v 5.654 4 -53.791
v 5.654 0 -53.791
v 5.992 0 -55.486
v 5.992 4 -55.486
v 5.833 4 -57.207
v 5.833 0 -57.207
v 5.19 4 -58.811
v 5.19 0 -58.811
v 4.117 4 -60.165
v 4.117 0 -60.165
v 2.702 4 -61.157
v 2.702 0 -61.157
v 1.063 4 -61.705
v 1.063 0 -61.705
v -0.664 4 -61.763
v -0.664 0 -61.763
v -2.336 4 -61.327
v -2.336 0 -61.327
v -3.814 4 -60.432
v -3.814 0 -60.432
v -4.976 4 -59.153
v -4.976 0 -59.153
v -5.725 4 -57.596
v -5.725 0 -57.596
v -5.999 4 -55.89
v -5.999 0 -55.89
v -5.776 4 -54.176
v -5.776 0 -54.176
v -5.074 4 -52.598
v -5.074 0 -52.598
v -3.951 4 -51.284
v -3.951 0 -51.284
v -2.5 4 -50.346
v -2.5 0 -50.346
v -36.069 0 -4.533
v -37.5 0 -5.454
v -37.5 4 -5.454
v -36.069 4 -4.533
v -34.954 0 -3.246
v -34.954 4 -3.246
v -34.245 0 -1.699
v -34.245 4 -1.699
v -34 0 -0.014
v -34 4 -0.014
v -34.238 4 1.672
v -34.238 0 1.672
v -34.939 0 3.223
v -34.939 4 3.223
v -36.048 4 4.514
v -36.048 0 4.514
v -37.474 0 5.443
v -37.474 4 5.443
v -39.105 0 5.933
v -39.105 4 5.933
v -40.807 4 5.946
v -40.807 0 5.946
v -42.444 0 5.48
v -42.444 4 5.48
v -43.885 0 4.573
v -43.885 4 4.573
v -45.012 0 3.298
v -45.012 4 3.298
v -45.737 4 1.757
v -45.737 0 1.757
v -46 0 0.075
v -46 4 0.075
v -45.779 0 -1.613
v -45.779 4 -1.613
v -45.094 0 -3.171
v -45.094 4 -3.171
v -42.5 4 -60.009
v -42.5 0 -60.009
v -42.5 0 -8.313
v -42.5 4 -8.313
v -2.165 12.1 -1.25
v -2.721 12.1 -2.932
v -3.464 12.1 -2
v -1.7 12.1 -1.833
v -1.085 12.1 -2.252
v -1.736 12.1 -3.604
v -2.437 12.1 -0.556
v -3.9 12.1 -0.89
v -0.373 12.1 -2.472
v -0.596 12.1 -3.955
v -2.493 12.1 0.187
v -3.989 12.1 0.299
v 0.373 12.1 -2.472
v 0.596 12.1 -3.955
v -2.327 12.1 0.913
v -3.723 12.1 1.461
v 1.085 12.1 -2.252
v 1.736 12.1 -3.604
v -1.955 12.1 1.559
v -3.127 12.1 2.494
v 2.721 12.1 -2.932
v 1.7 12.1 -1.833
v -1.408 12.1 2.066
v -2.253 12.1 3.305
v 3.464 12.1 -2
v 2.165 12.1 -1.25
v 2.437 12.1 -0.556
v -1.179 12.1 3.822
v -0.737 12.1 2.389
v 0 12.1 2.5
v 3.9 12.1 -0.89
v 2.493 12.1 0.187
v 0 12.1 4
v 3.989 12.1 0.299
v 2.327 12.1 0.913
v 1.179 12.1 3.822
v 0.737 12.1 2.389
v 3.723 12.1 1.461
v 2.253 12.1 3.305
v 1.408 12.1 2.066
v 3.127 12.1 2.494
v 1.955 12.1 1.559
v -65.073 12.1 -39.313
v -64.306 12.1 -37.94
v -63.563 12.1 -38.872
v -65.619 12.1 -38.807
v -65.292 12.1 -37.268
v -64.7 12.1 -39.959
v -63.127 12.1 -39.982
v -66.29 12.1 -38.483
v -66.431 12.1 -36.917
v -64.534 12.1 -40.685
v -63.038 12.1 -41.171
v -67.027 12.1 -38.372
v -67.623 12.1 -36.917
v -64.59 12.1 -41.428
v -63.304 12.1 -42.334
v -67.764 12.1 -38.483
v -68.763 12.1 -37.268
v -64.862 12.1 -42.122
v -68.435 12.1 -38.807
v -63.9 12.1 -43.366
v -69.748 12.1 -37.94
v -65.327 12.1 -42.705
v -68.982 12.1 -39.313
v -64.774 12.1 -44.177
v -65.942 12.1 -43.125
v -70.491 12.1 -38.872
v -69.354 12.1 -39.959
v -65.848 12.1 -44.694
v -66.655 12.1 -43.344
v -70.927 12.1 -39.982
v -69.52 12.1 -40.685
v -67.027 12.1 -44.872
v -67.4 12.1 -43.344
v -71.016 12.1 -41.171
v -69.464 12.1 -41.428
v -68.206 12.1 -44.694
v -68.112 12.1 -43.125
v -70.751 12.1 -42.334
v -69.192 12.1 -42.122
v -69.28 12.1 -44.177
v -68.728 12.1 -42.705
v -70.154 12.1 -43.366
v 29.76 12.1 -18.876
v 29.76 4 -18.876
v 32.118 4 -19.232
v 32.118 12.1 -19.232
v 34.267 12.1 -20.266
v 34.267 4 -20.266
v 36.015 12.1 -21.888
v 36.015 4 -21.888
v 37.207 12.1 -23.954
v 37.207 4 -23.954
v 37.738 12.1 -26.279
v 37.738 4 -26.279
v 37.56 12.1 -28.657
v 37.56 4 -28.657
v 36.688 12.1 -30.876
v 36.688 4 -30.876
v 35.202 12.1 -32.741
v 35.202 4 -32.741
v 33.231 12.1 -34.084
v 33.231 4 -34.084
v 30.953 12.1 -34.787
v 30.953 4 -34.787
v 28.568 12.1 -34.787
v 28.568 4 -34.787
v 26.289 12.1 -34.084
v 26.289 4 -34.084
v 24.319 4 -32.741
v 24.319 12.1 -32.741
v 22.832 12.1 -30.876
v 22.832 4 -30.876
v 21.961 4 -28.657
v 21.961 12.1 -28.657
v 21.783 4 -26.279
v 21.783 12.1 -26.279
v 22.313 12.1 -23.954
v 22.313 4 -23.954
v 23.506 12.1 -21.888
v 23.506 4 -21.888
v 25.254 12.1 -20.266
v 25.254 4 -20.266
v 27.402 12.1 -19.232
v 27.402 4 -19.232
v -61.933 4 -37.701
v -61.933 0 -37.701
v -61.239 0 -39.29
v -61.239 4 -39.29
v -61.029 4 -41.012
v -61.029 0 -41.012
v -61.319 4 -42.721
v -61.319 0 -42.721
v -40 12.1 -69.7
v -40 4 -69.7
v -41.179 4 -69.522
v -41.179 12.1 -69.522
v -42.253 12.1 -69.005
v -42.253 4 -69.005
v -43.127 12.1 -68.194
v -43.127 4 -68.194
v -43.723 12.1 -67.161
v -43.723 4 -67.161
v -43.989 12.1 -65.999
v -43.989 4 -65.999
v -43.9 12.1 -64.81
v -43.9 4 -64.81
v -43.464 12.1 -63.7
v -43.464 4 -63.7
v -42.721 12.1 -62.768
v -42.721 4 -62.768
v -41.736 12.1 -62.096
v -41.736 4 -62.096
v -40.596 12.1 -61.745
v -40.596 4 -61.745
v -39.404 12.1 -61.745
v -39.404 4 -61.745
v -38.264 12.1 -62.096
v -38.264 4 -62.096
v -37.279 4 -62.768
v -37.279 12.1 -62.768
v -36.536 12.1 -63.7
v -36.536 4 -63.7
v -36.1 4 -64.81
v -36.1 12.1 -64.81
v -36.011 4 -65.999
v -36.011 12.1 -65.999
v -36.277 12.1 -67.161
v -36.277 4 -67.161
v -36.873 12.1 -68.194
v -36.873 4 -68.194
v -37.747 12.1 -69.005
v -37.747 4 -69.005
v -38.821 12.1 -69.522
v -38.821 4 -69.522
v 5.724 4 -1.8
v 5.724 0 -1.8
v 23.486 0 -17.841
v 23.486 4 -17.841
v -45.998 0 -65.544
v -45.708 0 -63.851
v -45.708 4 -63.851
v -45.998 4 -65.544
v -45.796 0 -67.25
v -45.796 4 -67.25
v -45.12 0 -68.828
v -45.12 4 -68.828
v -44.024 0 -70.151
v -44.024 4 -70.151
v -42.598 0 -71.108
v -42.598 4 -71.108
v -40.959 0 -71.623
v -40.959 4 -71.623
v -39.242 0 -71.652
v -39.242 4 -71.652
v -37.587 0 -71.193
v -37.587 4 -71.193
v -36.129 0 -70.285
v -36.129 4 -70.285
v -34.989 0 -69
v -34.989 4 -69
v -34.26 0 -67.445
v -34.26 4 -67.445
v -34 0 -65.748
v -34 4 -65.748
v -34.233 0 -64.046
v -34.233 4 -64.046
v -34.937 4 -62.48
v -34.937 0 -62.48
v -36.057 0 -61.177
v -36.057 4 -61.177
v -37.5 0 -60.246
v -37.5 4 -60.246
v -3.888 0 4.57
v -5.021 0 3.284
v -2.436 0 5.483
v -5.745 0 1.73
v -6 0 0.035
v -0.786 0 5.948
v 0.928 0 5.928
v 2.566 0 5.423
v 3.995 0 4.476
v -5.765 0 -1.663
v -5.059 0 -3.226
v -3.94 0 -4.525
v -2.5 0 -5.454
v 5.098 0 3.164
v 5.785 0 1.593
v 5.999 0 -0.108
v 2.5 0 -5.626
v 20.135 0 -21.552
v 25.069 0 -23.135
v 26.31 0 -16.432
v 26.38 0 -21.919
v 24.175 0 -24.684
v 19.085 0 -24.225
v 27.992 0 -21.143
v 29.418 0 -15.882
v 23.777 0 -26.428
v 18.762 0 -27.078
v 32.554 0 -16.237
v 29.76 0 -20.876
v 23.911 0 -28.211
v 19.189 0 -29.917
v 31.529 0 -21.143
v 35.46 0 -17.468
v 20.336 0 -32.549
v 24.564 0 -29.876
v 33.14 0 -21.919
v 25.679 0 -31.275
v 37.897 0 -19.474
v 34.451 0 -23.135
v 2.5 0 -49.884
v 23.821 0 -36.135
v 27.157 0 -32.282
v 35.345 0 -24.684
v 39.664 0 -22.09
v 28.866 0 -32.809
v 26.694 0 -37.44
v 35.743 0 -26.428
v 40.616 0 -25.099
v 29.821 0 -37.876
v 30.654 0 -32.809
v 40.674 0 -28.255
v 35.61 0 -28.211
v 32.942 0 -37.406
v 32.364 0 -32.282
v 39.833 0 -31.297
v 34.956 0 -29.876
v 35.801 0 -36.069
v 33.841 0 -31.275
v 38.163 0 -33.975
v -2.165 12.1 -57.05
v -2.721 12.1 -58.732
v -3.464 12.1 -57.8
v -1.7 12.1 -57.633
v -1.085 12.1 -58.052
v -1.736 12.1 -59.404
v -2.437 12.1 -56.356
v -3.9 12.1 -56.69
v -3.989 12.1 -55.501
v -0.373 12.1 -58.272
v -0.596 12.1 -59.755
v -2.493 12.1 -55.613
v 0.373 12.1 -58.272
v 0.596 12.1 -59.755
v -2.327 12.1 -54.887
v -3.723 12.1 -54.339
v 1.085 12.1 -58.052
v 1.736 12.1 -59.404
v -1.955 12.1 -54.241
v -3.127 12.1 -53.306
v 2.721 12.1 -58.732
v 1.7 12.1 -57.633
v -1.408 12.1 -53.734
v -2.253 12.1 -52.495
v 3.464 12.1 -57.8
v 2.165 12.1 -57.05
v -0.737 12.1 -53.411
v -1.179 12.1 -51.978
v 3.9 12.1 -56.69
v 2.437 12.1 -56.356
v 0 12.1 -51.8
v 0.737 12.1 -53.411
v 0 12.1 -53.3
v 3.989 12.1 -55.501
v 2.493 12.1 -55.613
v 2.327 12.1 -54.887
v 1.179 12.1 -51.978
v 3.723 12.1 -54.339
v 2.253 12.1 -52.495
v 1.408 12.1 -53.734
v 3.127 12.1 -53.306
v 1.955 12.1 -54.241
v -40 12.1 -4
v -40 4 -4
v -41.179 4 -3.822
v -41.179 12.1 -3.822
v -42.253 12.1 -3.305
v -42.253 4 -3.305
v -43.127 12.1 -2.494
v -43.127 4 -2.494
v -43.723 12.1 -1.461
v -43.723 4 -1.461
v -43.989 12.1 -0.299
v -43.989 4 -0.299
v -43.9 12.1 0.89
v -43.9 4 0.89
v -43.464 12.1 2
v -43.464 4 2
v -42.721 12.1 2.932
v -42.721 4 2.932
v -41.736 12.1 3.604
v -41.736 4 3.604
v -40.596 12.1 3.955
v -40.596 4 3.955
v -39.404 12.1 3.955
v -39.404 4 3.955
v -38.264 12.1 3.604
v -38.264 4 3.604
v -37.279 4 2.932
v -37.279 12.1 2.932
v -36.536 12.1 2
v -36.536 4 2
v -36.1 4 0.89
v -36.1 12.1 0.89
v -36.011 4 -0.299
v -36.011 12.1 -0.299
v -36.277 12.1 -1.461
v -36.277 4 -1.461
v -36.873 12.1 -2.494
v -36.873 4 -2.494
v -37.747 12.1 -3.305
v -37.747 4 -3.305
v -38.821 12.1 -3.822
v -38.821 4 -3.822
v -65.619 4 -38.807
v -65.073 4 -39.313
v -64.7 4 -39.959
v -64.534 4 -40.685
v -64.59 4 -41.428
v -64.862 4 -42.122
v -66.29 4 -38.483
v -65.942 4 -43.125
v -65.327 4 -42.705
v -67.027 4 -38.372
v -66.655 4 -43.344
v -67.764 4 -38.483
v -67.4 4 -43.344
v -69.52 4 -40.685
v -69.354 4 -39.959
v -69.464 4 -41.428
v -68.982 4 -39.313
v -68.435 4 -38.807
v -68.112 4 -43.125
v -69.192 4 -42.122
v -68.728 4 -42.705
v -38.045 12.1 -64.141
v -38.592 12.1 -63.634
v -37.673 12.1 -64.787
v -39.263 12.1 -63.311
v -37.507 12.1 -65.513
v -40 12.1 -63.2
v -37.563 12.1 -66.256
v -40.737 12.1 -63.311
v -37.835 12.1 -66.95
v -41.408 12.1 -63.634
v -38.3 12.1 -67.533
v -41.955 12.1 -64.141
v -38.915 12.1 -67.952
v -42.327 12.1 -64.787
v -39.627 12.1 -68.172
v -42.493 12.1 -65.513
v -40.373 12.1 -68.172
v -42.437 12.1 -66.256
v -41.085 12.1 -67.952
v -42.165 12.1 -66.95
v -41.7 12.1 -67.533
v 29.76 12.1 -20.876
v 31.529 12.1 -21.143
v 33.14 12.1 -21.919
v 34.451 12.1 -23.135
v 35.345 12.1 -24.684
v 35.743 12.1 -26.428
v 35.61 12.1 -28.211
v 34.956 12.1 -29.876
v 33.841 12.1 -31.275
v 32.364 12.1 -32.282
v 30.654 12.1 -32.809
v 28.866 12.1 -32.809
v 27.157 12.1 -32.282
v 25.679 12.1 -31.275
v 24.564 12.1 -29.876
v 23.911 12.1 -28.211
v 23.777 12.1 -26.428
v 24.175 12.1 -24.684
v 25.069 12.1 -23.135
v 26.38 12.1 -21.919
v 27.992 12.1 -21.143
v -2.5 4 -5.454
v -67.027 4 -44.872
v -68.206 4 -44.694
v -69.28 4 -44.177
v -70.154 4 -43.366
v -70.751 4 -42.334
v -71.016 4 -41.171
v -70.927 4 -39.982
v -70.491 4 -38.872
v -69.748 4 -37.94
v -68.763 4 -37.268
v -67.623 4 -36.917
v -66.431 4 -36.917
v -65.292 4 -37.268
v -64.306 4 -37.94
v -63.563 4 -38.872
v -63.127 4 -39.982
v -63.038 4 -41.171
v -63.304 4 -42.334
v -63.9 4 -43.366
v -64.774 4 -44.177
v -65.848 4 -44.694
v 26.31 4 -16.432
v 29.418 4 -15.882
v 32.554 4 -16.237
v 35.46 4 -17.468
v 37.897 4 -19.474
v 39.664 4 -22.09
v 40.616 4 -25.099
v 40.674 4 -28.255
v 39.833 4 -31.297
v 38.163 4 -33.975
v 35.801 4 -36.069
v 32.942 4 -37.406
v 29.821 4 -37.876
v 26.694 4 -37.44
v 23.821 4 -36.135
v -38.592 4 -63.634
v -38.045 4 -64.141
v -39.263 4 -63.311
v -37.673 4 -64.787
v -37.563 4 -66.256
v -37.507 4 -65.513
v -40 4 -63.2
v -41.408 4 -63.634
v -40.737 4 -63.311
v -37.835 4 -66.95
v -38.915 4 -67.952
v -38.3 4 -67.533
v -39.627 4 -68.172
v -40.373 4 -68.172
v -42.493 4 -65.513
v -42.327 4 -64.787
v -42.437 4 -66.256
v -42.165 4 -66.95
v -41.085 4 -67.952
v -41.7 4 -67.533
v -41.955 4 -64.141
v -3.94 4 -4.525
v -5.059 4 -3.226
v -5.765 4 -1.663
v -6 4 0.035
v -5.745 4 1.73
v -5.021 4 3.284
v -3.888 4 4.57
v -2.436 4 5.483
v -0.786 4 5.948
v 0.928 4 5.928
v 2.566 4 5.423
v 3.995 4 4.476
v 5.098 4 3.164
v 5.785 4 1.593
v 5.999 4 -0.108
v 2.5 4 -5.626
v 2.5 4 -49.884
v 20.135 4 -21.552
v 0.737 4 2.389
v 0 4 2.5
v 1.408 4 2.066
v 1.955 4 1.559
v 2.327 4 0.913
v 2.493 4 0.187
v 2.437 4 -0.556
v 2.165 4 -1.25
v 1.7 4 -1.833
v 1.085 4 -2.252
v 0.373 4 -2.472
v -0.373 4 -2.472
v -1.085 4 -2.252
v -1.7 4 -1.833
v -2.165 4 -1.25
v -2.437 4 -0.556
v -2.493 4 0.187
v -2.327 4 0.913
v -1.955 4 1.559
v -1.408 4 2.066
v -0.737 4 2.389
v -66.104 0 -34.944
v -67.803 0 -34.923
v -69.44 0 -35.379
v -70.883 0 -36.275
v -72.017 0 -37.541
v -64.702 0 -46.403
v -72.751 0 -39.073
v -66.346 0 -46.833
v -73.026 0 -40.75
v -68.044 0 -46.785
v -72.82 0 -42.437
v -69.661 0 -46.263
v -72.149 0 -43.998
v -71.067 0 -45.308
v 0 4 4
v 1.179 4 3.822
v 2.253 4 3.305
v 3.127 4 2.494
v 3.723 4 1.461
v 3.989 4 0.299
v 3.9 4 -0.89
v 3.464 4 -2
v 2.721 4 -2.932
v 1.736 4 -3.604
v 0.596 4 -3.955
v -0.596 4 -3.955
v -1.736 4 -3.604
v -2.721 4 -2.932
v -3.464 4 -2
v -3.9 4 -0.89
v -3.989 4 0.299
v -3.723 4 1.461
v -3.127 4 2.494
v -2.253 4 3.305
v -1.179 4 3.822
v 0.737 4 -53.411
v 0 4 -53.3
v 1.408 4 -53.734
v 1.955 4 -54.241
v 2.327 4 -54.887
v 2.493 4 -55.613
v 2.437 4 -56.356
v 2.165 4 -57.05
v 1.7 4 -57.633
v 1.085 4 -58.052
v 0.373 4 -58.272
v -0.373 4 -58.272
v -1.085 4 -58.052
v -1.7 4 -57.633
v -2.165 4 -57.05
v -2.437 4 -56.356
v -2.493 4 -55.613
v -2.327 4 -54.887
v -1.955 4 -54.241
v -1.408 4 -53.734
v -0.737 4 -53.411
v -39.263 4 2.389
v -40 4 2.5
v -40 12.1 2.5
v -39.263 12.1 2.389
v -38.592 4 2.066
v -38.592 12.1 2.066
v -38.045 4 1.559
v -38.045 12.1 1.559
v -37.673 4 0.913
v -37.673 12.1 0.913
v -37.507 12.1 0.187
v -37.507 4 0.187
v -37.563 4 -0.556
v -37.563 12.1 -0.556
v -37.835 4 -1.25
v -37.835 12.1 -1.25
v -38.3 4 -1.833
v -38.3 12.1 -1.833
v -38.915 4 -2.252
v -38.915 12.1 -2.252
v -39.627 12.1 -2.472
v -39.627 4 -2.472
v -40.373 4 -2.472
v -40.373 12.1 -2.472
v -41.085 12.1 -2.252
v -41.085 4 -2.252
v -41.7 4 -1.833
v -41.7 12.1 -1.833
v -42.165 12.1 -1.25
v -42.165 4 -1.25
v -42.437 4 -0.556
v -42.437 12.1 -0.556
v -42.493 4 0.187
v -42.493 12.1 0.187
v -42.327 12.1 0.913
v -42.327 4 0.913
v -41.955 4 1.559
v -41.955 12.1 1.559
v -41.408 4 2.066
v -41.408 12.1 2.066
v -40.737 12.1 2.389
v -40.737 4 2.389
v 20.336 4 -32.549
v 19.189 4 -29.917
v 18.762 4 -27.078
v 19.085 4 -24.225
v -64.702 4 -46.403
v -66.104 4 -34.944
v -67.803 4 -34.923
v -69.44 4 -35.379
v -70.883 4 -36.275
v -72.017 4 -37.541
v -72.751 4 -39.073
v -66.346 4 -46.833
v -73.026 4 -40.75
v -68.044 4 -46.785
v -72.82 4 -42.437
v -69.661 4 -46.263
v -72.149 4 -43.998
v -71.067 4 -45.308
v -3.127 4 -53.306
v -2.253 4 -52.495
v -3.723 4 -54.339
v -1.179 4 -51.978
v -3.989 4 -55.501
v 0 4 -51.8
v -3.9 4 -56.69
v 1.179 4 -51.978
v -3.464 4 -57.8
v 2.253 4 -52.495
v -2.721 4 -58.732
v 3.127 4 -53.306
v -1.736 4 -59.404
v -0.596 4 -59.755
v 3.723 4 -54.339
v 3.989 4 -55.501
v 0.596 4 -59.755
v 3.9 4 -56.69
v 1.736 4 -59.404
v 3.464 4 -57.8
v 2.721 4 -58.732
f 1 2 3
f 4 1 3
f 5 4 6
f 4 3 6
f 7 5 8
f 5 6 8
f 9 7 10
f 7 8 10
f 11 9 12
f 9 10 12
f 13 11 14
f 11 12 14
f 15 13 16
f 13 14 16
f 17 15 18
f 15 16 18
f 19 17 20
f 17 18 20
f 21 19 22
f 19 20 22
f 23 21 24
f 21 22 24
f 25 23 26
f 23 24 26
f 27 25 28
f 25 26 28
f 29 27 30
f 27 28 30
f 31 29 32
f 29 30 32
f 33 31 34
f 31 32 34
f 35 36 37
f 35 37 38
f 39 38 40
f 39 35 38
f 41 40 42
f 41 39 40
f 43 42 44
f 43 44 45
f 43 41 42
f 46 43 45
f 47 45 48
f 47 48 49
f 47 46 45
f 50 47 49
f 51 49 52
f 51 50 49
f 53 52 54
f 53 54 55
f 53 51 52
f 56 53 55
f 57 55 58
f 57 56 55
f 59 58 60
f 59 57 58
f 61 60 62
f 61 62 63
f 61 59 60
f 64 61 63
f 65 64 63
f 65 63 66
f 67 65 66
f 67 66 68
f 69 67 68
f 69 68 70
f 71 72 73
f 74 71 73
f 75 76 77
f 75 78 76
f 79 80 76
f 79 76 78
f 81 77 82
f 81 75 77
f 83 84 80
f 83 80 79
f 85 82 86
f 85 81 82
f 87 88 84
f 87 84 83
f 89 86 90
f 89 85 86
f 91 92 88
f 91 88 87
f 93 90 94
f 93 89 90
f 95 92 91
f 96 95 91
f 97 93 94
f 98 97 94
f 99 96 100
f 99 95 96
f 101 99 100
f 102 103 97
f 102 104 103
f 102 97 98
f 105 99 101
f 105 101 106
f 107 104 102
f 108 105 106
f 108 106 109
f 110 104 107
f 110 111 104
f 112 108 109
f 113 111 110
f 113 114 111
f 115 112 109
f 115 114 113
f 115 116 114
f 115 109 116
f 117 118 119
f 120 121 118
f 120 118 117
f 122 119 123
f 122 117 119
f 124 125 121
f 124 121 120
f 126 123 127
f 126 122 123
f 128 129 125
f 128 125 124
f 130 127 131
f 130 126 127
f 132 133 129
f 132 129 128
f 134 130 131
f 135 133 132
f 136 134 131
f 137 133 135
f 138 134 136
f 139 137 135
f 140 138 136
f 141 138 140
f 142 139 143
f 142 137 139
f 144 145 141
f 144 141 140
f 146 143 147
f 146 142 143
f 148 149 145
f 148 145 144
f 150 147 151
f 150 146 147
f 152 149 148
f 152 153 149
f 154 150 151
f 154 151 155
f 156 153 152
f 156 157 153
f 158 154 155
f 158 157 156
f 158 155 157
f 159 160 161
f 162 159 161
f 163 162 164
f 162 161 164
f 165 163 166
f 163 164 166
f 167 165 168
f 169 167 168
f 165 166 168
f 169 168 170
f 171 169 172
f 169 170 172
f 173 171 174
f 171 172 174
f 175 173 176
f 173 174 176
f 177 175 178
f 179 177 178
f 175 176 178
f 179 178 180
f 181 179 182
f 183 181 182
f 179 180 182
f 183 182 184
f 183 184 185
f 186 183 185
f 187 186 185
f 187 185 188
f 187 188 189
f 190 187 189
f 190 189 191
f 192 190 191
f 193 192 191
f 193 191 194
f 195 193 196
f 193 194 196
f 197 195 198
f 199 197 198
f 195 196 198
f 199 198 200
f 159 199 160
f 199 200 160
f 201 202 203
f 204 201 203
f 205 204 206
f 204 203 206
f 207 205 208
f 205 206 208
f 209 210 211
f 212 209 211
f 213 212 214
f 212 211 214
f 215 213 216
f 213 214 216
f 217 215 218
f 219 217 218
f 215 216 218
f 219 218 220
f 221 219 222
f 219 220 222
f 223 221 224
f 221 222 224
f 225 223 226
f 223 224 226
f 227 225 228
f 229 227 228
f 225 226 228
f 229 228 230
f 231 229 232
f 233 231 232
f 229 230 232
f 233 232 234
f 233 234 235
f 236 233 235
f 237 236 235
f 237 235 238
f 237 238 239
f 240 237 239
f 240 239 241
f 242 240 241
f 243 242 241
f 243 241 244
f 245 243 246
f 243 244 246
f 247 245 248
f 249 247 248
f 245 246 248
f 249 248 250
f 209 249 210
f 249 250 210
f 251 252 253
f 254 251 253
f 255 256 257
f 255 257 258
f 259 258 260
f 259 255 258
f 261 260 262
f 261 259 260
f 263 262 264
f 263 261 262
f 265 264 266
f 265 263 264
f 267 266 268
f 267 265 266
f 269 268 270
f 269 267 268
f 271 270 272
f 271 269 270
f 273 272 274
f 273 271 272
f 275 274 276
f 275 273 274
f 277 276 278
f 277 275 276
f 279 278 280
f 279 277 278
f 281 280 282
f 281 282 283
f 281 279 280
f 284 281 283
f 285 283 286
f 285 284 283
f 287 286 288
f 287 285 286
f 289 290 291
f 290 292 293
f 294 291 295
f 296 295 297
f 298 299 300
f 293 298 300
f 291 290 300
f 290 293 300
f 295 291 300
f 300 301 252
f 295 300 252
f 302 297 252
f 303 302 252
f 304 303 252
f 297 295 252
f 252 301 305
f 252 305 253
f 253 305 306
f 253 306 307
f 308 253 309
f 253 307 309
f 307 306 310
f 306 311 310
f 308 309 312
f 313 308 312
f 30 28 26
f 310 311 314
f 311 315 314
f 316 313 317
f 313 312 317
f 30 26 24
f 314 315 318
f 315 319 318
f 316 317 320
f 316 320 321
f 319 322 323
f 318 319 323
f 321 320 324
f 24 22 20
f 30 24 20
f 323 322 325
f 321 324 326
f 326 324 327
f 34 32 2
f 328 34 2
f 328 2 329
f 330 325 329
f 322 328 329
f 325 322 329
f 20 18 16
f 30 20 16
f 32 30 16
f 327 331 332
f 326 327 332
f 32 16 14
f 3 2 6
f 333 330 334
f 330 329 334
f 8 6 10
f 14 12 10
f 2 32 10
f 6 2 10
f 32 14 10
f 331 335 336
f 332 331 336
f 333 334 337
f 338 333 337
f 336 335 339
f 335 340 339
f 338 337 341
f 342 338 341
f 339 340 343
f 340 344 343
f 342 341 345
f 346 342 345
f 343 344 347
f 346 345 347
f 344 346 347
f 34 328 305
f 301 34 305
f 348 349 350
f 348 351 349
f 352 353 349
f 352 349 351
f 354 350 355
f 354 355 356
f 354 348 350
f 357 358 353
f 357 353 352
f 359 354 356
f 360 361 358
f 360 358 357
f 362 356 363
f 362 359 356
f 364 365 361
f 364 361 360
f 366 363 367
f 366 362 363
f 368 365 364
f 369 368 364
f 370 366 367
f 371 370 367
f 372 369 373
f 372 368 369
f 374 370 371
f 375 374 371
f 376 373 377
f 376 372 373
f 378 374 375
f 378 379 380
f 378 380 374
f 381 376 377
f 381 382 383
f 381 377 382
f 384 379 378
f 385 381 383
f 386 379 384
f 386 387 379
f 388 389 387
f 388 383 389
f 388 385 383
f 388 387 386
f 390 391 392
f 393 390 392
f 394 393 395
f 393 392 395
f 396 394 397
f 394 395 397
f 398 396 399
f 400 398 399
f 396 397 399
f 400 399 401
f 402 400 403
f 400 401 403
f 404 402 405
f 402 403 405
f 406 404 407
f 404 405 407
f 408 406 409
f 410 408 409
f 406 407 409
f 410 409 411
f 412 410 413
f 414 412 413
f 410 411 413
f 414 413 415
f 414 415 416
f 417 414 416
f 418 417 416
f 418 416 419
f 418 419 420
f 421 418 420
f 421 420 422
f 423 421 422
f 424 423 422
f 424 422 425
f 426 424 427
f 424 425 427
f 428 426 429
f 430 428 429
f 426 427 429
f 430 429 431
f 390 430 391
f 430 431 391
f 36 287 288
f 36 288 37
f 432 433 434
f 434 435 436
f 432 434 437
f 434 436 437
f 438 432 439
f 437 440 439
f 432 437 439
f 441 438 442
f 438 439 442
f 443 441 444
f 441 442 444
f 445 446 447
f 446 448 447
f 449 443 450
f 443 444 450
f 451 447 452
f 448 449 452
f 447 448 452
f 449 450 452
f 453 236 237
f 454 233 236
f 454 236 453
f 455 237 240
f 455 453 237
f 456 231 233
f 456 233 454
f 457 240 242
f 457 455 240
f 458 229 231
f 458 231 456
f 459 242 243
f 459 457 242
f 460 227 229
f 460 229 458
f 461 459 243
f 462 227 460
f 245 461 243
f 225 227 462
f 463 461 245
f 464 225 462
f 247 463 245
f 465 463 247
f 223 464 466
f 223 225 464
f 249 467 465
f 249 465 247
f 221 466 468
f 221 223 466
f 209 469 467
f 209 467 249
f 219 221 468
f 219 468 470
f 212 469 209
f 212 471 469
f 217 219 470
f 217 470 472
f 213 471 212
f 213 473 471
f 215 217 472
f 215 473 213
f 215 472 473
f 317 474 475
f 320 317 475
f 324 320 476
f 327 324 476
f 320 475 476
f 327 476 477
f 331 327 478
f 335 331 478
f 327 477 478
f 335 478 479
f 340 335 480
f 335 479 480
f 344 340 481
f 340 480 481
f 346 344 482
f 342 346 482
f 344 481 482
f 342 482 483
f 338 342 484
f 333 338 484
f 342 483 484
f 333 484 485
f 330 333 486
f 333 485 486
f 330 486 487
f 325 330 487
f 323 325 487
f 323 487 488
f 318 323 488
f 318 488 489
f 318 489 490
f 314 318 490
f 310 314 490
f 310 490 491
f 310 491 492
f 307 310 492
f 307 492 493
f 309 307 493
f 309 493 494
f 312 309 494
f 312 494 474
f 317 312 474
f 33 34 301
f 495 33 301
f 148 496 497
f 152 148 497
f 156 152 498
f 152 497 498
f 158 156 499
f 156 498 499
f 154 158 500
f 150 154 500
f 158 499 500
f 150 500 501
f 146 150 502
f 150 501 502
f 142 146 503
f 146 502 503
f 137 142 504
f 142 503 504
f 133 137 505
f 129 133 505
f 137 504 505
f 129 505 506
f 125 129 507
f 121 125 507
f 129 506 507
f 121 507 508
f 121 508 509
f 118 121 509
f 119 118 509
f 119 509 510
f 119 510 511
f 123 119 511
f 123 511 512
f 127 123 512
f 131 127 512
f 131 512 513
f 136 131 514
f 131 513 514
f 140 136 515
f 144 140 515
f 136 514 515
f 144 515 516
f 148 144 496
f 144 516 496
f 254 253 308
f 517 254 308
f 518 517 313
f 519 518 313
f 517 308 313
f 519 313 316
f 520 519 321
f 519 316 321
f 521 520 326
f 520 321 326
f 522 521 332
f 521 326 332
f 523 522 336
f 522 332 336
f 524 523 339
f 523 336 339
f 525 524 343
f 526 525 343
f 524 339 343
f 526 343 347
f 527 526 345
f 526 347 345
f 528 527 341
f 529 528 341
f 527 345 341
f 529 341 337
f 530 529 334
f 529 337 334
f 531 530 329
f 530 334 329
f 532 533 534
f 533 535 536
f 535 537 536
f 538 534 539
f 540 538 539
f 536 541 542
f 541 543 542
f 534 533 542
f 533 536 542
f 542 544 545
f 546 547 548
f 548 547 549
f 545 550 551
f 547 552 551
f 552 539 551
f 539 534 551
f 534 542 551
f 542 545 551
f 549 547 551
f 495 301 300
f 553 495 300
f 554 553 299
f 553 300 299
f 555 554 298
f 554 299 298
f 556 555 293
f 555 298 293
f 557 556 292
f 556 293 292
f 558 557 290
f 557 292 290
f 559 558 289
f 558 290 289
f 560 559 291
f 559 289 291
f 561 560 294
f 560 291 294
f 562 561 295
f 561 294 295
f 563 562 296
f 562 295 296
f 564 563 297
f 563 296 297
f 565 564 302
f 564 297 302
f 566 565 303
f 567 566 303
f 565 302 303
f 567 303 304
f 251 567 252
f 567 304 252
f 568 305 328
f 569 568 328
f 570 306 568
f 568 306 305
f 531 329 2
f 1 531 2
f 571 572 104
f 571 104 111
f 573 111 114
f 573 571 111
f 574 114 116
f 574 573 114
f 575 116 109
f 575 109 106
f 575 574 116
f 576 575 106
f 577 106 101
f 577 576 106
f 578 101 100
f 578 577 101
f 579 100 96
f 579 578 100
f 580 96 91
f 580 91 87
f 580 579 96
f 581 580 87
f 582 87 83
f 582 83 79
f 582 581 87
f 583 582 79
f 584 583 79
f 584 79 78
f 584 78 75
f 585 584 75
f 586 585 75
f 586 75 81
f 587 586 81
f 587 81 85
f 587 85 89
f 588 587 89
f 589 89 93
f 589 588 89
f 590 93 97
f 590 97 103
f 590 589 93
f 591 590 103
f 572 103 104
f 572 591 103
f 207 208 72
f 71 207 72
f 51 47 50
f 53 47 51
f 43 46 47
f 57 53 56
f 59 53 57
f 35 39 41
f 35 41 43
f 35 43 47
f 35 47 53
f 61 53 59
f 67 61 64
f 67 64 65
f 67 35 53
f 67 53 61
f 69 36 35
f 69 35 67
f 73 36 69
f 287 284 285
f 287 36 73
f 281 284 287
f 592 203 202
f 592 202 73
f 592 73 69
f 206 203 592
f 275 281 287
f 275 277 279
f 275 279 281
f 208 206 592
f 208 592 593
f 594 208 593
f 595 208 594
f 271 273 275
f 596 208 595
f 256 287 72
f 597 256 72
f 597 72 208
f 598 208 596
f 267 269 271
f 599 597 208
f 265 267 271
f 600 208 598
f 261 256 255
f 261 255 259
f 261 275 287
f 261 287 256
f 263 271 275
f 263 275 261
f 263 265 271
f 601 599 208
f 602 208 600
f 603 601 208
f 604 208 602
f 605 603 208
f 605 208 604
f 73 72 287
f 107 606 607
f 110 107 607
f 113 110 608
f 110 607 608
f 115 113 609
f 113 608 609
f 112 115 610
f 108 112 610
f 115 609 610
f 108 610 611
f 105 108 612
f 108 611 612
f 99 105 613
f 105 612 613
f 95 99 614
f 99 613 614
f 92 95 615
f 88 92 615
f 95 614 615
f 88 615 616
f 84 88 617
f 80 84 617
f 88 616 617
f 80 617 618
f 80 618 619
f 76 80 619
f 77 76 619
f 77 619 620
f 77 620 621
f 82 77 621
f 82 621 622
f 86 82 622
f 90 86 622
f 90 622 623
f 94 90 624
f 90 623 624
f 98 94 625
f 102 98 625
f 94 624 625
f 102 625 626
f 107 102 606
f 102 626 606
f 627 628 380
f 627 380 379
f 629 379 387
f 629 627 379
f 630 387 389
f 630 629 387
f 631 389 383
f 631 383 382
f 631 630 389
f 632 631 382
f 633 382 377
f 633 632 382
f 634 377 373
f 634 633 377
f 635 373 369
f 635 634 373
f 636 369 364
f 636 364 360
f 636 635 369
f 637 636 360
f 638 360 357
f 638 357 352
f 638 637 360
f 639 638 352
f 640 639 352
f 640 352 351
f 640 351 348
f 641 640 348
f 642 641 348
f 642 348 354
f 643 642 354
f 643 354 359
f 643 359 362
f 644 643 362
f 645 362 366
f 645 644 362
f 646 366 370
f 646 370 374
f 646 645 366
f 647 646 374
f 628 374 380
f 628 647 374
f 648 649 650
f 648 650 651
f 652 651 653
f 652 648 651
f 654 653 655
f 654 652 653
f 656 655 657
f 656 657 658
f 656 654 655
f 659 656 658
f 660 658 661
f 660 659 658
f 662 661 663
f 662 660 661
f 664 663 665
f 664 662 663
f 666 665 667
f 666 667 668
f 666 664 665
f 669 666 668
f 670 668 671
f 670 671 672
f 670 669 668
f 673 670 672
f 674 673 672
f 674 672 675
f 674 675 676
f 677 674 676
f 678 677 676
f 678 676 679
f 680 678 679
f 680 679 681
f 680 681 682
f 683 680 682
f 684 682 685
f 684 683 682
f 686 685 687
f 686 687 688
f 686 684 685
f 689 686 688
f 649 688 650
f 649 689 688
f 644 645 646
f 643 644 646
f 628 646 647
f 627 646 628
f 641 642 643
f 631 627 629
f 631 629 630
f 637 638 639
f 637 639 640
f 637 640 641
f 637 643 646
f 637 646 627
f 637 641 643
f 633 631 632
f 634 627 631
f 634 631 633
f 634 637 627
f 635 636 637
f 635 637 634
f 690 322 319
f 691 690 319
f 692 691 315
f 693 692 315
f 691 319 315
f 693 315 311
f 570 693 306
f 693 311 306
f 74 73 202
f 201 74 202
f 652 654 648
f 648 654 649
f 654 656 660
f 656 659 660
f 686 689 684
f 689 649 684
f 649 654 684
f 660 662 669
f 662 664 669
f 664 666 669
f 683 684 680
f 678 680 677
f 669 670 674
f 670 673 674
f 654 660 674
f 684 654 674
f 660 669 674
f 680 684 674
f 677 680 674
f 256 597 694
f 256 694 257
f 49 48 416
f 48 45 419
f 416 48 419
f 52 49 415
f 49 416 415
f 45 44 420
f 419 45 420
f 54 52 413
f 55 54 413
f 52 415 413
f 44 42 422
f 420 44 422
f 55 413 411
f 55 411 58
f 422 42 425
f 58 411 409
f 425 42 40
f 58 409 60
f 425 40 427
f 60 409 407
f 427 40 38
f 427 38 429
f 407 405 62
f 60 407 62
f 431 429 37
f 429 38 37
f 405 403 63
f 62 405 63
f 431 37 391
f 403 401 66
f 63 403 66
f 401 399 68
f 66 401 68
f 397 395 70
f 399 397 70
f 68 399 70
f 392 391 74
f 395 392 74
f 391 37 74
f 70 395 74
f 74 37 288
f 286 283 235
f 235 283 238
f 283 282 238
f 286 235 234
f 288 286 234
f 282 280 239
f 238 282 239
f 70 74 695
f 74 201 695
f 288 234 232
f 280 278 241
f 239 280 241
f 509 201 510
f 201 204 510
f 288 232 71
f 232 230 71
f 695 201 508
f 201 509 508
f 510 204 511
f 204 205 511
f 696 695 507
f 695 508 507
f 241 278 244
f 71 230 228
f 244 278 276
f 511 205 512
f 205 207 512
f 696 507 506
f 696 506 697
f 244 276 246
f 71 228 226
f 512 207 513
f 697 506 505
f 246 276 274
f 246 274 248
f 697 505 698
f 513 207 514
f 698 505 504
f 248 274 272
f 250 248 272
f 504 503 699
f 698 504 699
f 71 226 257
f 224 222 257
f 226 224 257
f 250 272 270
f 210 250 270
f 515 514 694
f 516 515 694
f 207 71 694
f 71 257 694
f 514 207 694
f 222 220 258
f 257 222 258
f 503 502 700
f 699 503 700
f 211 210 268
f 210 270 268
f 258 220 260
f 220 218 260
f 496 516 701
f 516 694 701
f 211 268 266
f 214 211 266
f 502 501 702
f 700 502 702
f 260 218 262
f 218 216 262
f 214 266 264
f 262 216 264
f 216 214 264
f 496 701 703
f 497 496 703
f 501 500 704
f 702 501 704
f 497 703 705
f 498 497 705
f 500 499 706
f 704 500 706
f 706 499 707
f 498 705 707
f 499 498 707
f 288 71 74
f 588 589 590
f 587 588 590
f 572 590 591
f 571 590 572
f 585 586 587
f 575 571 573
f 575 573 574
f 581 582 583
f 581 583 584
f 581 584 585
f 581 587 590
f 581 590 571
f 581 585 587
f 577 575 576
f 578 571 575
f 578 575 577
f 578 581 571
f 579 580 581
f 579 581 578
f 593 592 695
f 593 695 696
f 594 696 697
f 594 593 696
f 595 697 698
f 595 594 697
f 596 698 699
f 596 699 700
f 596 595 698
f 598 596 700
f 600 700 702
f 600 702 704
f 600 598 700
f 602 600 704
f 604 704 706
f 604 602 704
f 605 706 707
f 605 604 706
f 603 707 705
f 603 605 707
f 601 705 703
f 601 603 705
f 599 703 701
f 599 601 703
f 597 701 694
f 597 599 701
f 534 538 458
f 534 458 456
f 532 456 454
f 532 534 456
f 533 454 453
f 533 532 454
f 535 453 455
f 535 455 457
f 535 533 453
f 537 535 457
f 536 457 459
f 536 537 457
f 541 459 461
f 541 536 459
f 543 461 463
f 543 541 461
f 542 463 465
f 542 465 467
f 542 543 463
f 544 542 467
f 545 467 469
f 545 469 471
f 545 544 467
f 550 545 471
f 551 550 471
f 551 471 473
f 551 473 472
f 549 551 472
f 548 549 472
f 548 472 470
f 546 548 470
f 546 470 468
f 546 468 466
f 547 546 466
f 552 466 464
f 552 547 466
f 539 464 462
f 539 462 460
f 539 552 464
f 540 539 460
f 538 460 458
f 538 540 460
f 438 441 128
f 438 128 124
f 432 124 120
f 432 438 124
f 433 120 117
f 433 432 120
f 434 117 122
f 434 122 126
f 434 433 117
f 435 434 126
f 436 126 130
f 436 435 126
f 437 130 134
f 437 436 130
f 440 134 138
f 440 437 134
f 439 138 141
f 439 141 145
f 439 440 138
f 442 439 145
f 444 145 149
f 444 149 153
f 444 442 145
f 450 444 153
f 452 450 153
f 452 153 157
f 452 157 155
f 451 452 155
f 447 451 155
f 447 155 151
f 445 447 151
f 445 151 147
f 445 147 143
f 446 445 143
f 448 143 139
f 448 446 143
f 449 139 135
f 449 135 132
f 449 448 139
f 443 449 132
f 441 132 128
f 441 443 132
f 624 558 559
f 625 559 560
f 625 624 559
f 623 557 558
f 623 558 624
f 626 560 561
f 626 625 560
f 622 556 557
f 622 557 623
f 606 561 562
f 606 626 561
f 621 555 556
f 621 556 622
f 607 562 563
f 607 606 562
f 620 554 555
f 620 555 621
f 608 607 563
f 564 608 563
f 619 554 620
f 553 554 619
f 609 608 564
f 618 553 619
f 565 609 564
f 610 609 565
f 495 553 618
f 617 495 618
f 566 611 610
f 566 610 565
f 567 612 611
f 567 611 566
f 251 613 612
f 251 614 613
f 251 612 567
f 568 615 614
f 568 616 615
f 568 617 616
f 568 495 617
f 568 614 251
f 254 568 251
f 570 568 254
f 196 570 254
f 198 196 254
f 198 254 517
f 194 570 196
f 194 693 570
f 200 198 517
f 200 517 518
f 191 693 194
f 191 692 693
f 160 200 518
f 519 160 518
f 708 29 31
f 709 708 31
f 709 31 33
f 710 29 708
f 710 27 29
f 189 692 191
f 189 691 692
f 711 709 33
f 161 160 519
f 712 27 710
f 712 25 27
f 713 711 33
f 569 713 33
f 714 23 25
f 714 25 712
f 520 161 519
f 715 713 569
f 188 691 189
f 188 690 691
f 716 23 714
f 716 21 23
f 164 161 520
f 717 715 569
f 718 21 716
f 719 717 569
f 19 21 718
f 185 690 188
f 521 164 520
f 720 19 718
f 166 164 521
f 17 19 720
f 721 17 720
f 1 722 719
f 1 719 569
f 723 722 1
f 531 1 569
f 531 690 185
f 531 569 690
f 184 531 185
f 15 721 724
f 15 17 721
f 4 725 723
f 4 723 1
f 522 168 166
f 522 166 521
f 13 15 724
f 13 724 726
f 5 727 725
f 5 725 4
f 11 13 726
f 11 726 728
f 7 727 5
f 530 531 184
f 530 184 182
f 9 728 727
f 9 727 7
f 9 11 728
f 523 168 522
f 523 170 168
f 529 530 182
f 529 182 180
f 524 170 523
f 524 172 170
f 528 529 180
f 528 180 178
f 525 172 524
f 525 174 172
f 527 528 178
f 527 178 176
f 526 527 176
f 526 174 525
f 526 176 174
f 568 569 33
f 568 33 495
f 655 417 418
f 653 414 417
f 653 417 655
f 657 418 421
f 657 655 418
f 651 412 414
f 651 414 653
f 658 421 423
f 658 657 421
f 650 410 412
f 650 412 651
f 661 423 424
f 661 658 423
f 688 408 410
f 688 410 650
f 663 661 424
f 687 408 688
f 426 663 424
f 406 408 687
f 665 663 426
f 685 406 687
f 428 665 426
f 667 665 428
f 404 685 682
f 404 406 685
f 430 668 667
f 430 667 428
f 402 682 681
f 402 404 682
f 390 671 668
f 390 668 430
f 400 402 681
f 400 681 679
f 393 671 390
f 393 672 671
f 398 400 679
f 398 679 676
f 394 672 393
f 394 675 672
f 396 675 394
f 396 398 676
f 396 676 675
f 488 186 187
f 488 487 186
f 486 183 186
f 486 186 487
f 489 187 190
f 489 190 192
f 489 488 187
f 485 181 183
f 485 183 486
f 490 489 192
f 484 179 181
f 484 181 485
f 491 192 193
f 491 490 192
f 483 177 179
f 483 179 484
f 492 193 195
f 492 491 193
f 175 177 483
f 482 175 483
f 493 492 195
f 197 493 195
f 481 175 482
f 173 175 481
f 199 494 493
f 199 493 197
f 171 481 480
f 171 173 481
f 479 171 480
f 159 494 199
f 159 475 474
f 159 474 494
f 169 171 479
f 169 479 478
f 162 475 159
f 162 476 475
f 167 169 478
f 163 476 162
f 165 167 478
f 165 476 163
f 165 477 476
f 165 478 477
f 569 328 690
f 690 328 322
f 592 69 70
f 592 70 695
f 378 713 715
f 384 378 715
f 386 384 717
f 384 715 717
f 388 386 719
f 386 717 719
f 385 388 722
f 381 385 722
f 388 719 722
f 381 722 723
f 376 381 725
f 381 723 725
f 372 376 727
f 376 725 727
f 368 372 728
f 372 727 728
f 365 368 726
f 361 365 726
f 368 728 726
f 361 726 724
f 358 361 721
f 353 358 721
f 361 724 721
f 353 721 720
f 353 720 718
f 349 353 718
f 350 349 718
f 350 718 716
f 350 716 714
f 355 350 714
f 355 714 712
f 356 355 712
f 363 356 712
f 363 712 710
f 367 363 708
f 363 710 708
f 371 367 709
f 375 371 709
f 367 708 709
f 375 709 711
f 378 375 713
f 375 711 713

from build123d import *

# Parameters (mm, degrees)
EXTRUDE_1_DEPTH     = 4
EXTRUDE_1_2_DEPTH   = 4
SKETCH_3_R          = 4
SKETCH_3_R_2        = 2.5
EXTRUDE_2_DEPTH     = 8.1
SKETCH_5_R          = 4
SKETCH_5_R_2        = 2.5
SKETCH_5_R_3        = 8
EXTRUDE_3_DEPTH     = 8.1
SKETCH_6_R          = 6
CUT_EXTRUDE_1_DEPTH = 104.054679137


with BuildPart() as part:
    # Эскиз1 → Бобышка-Вытянуть1 (new body)
    with BuildSketch(Plane(origin=(0, 0, 0), x_dir=(1, 0, 0), z_dir=(0, 1, 0))):
        with BuildLine():
            Line((-64.701657296, 46.403150718), (-45.708049543, 63.851170528))
            ThreePointArc((-45.708049543, 63.851170528), (-37.586941576, 71.193373193), (-37.5, 60.245643943))
            Line((-37.5, 60.245643943), (-37.5, 5.454356057))
            ThreePointArc((-37.5, 5.454356057), (-38.272069955, -5.745803491), (-45.093798955, 3.170680085))
            Line((-45.093798955, 3.170680085), (-66.103993638, 34.943592009))
            ThreePointArc((-66.103993638, 34.943592009), (-72.98273861, 41.600945273), (-64.701657296, 46.403150718))
        make_face()
        with BuildLine():
            Line((-61.319115896, 42.72097559), (-42.5, 60.008702662))
            Line((-42.5, 60.008702662), (-42.5, 8.313130943))
            Line((-42.5, 8.313130943), (-61.933366483, 37.701466034))
            ThreePointArc((-61.933366483, 37.701466034), (-61.071592268, 40.143346965), (-61.319115896, 42.72097559))
        make_face(mode=Mode.SUBTRACT)
    extrude(amount=EXTRUDE_1_DEPTH)

    # Эскиз3 → Бобышка-Вытянуть2 (add)
    # profile 1 of 3: a face of its own
    with BuildSketch(Plane(origin=(0, 4, 0), x_dir=(1, 0, 0), z_dir=(0, 1, 0))):
        with Locations(Location((-67.027165439, 40.872146119, 0), (0, 0, 90))):
            Circle(SKETCH_3_R)
        with Locations(Location((-67.027165439, 40.872146119, 0), (0, 0, 270))):
            Circle(SKETCH_3_R_2, mode=Mode.SUBTRACT)
    # profile 2 of 3: a face of its own
    with BuildSketch(Plane(origin=(0, 4, 0), x_dir=(1, 0, 0), z_dir=(0, 1, 0))):
        with Locations(Location((-40, 65.7, 0), (0, 0, 90))):
            Circle(SKETCH_3_R)
        with Locations(Location((-40, 65.7, 0), (0, 0, 270))):
            Circle(SKETCH_3_R_2, mode=Mode.SUBTRACT)
    # profile 3 of 3: a face of its own
    with BuildSketch(Plane(origin=(0, 4, 0), x_dir=(1, 0, 0), z_dir=(0, 1, 0))):
        with Locations(Location((-40, 0, 0), (0, 0, 90))):
            Circle(SKETCH_3_R)
        with Locations(Location((-40, 0, 0), (0, 0, 270))):
            Circle(SKETCH_3_R_2, mode=Mode.SUBTRACT)
    extrude(amount=EXTRUDE_2_DEPTH)


with BuildPart() as body_2:
    # Эскиз1 → Extrude 1 2 (new body)
    with BuildSketch(Plane(origin=(0, 0, 0), x_dir=(1, 0, 0), z_dir=(0, 1, 0))):
        with BuildLine():
            Line((-2.5, 50.345643943), (-2.5, 5.454356057))
            ThreePointArc((-2.5, 5.454356057), (-2.436350888, -5.483082559), (5.723536854, 1.800312716))
            Line((5.723536854, 1.800312716), (23.485802209, 17.841335562))
            ThreePointArc((23.485802209, 17.841335562), (40.75840018, 26.67494221), (23.820802166, 36.135017294))
            Line((23.820802166, 36.135017294), (5.653785721, 53.791341986))
            ThreePointArc((5.653785721, 53.791341986), (-2.335551293, 61.326771223), (-2.5, 50.345643943))
        make_face()
        with BuildLine():
            Line((20.134637111, 21.55208919), (2.5, 5.626326843))
            Line((2.5, 5.626326843), (2.5, 49.884082804))
            Line((2.5, 49.884082804), (20.336024345, 32.549445717))
            ThreePointArc((20.336024345, 32.549445717), (18.762088009, 27.077745962), (20.134637111, 21.55208919))
        make_face(mode=Mode.SUBTRACT)
    extrude(amount=EXTRUDE_1_2_DEPTH)

    # Эскиз5 → Бобышка-Вытянуть3 (add)
    # profile 1 of 3: a face of its own
    with BuildSketch(Plane(origin=(0, 4, 0), x_dir=(1, 0, 0), z_dir=(0, 1, 0))):
        with Locations(Location((0, 55.8, 0), (0, 0, 270))):
            Circle(SKETCH_5_R)
        with Locations(Location((0, 55.8, 0), (0, 0, 270))):
            Circle(SKETCH_5_R_2, mode=Mode.SUBTRACT)
    # profile 2 of 3: a face of its own
    with BuildSketch(Plane(origin=(0, 4, 0), x_dir=(1, 0, 0), z_dir=(0, 1, 0))):
        with Locations(Location((0, 0, 0), (0, 0, 270))):
            Circle(SKETCH_5_R)
        with Locations(Location((0, 0, 0), (0, 0, 270))):
            Circle(SKETCH_5_R_2, mode=Mode.SUBTRACT)
    # profile 3 of 3: a face of its own
    with BuildSketch(Plane(origin=(0, 4, 0), x_dir=(1, 0, 0), z_dir=(0, 1, 0))):
        with Locations(Location((29.760244095, 26.876344086, 0), (0, 0, 270))):
            Circle(SKETCH_5_R_3)
    extrude(amount=EXTRUDE_3_DEPTH)

    # Эскиз6 → Вырез-Вытянуть1 (cut, through all)
    with BuildSketch(Plane(origin=(0, 12.1, 0), x_dir=(1, 0, 0), z_dir=(0, 1, 0))):
        with Locations(Location((29.760244095, 26.876344086, 0), (0, 0, 270))):
            Circle(SKETCH_6_R)
    extrude(amount=-CUT_EXTRUDE_1_DEPTH, mode=Mode.SUBTRACT)


solid = Compound([part.part, body_2.part])
